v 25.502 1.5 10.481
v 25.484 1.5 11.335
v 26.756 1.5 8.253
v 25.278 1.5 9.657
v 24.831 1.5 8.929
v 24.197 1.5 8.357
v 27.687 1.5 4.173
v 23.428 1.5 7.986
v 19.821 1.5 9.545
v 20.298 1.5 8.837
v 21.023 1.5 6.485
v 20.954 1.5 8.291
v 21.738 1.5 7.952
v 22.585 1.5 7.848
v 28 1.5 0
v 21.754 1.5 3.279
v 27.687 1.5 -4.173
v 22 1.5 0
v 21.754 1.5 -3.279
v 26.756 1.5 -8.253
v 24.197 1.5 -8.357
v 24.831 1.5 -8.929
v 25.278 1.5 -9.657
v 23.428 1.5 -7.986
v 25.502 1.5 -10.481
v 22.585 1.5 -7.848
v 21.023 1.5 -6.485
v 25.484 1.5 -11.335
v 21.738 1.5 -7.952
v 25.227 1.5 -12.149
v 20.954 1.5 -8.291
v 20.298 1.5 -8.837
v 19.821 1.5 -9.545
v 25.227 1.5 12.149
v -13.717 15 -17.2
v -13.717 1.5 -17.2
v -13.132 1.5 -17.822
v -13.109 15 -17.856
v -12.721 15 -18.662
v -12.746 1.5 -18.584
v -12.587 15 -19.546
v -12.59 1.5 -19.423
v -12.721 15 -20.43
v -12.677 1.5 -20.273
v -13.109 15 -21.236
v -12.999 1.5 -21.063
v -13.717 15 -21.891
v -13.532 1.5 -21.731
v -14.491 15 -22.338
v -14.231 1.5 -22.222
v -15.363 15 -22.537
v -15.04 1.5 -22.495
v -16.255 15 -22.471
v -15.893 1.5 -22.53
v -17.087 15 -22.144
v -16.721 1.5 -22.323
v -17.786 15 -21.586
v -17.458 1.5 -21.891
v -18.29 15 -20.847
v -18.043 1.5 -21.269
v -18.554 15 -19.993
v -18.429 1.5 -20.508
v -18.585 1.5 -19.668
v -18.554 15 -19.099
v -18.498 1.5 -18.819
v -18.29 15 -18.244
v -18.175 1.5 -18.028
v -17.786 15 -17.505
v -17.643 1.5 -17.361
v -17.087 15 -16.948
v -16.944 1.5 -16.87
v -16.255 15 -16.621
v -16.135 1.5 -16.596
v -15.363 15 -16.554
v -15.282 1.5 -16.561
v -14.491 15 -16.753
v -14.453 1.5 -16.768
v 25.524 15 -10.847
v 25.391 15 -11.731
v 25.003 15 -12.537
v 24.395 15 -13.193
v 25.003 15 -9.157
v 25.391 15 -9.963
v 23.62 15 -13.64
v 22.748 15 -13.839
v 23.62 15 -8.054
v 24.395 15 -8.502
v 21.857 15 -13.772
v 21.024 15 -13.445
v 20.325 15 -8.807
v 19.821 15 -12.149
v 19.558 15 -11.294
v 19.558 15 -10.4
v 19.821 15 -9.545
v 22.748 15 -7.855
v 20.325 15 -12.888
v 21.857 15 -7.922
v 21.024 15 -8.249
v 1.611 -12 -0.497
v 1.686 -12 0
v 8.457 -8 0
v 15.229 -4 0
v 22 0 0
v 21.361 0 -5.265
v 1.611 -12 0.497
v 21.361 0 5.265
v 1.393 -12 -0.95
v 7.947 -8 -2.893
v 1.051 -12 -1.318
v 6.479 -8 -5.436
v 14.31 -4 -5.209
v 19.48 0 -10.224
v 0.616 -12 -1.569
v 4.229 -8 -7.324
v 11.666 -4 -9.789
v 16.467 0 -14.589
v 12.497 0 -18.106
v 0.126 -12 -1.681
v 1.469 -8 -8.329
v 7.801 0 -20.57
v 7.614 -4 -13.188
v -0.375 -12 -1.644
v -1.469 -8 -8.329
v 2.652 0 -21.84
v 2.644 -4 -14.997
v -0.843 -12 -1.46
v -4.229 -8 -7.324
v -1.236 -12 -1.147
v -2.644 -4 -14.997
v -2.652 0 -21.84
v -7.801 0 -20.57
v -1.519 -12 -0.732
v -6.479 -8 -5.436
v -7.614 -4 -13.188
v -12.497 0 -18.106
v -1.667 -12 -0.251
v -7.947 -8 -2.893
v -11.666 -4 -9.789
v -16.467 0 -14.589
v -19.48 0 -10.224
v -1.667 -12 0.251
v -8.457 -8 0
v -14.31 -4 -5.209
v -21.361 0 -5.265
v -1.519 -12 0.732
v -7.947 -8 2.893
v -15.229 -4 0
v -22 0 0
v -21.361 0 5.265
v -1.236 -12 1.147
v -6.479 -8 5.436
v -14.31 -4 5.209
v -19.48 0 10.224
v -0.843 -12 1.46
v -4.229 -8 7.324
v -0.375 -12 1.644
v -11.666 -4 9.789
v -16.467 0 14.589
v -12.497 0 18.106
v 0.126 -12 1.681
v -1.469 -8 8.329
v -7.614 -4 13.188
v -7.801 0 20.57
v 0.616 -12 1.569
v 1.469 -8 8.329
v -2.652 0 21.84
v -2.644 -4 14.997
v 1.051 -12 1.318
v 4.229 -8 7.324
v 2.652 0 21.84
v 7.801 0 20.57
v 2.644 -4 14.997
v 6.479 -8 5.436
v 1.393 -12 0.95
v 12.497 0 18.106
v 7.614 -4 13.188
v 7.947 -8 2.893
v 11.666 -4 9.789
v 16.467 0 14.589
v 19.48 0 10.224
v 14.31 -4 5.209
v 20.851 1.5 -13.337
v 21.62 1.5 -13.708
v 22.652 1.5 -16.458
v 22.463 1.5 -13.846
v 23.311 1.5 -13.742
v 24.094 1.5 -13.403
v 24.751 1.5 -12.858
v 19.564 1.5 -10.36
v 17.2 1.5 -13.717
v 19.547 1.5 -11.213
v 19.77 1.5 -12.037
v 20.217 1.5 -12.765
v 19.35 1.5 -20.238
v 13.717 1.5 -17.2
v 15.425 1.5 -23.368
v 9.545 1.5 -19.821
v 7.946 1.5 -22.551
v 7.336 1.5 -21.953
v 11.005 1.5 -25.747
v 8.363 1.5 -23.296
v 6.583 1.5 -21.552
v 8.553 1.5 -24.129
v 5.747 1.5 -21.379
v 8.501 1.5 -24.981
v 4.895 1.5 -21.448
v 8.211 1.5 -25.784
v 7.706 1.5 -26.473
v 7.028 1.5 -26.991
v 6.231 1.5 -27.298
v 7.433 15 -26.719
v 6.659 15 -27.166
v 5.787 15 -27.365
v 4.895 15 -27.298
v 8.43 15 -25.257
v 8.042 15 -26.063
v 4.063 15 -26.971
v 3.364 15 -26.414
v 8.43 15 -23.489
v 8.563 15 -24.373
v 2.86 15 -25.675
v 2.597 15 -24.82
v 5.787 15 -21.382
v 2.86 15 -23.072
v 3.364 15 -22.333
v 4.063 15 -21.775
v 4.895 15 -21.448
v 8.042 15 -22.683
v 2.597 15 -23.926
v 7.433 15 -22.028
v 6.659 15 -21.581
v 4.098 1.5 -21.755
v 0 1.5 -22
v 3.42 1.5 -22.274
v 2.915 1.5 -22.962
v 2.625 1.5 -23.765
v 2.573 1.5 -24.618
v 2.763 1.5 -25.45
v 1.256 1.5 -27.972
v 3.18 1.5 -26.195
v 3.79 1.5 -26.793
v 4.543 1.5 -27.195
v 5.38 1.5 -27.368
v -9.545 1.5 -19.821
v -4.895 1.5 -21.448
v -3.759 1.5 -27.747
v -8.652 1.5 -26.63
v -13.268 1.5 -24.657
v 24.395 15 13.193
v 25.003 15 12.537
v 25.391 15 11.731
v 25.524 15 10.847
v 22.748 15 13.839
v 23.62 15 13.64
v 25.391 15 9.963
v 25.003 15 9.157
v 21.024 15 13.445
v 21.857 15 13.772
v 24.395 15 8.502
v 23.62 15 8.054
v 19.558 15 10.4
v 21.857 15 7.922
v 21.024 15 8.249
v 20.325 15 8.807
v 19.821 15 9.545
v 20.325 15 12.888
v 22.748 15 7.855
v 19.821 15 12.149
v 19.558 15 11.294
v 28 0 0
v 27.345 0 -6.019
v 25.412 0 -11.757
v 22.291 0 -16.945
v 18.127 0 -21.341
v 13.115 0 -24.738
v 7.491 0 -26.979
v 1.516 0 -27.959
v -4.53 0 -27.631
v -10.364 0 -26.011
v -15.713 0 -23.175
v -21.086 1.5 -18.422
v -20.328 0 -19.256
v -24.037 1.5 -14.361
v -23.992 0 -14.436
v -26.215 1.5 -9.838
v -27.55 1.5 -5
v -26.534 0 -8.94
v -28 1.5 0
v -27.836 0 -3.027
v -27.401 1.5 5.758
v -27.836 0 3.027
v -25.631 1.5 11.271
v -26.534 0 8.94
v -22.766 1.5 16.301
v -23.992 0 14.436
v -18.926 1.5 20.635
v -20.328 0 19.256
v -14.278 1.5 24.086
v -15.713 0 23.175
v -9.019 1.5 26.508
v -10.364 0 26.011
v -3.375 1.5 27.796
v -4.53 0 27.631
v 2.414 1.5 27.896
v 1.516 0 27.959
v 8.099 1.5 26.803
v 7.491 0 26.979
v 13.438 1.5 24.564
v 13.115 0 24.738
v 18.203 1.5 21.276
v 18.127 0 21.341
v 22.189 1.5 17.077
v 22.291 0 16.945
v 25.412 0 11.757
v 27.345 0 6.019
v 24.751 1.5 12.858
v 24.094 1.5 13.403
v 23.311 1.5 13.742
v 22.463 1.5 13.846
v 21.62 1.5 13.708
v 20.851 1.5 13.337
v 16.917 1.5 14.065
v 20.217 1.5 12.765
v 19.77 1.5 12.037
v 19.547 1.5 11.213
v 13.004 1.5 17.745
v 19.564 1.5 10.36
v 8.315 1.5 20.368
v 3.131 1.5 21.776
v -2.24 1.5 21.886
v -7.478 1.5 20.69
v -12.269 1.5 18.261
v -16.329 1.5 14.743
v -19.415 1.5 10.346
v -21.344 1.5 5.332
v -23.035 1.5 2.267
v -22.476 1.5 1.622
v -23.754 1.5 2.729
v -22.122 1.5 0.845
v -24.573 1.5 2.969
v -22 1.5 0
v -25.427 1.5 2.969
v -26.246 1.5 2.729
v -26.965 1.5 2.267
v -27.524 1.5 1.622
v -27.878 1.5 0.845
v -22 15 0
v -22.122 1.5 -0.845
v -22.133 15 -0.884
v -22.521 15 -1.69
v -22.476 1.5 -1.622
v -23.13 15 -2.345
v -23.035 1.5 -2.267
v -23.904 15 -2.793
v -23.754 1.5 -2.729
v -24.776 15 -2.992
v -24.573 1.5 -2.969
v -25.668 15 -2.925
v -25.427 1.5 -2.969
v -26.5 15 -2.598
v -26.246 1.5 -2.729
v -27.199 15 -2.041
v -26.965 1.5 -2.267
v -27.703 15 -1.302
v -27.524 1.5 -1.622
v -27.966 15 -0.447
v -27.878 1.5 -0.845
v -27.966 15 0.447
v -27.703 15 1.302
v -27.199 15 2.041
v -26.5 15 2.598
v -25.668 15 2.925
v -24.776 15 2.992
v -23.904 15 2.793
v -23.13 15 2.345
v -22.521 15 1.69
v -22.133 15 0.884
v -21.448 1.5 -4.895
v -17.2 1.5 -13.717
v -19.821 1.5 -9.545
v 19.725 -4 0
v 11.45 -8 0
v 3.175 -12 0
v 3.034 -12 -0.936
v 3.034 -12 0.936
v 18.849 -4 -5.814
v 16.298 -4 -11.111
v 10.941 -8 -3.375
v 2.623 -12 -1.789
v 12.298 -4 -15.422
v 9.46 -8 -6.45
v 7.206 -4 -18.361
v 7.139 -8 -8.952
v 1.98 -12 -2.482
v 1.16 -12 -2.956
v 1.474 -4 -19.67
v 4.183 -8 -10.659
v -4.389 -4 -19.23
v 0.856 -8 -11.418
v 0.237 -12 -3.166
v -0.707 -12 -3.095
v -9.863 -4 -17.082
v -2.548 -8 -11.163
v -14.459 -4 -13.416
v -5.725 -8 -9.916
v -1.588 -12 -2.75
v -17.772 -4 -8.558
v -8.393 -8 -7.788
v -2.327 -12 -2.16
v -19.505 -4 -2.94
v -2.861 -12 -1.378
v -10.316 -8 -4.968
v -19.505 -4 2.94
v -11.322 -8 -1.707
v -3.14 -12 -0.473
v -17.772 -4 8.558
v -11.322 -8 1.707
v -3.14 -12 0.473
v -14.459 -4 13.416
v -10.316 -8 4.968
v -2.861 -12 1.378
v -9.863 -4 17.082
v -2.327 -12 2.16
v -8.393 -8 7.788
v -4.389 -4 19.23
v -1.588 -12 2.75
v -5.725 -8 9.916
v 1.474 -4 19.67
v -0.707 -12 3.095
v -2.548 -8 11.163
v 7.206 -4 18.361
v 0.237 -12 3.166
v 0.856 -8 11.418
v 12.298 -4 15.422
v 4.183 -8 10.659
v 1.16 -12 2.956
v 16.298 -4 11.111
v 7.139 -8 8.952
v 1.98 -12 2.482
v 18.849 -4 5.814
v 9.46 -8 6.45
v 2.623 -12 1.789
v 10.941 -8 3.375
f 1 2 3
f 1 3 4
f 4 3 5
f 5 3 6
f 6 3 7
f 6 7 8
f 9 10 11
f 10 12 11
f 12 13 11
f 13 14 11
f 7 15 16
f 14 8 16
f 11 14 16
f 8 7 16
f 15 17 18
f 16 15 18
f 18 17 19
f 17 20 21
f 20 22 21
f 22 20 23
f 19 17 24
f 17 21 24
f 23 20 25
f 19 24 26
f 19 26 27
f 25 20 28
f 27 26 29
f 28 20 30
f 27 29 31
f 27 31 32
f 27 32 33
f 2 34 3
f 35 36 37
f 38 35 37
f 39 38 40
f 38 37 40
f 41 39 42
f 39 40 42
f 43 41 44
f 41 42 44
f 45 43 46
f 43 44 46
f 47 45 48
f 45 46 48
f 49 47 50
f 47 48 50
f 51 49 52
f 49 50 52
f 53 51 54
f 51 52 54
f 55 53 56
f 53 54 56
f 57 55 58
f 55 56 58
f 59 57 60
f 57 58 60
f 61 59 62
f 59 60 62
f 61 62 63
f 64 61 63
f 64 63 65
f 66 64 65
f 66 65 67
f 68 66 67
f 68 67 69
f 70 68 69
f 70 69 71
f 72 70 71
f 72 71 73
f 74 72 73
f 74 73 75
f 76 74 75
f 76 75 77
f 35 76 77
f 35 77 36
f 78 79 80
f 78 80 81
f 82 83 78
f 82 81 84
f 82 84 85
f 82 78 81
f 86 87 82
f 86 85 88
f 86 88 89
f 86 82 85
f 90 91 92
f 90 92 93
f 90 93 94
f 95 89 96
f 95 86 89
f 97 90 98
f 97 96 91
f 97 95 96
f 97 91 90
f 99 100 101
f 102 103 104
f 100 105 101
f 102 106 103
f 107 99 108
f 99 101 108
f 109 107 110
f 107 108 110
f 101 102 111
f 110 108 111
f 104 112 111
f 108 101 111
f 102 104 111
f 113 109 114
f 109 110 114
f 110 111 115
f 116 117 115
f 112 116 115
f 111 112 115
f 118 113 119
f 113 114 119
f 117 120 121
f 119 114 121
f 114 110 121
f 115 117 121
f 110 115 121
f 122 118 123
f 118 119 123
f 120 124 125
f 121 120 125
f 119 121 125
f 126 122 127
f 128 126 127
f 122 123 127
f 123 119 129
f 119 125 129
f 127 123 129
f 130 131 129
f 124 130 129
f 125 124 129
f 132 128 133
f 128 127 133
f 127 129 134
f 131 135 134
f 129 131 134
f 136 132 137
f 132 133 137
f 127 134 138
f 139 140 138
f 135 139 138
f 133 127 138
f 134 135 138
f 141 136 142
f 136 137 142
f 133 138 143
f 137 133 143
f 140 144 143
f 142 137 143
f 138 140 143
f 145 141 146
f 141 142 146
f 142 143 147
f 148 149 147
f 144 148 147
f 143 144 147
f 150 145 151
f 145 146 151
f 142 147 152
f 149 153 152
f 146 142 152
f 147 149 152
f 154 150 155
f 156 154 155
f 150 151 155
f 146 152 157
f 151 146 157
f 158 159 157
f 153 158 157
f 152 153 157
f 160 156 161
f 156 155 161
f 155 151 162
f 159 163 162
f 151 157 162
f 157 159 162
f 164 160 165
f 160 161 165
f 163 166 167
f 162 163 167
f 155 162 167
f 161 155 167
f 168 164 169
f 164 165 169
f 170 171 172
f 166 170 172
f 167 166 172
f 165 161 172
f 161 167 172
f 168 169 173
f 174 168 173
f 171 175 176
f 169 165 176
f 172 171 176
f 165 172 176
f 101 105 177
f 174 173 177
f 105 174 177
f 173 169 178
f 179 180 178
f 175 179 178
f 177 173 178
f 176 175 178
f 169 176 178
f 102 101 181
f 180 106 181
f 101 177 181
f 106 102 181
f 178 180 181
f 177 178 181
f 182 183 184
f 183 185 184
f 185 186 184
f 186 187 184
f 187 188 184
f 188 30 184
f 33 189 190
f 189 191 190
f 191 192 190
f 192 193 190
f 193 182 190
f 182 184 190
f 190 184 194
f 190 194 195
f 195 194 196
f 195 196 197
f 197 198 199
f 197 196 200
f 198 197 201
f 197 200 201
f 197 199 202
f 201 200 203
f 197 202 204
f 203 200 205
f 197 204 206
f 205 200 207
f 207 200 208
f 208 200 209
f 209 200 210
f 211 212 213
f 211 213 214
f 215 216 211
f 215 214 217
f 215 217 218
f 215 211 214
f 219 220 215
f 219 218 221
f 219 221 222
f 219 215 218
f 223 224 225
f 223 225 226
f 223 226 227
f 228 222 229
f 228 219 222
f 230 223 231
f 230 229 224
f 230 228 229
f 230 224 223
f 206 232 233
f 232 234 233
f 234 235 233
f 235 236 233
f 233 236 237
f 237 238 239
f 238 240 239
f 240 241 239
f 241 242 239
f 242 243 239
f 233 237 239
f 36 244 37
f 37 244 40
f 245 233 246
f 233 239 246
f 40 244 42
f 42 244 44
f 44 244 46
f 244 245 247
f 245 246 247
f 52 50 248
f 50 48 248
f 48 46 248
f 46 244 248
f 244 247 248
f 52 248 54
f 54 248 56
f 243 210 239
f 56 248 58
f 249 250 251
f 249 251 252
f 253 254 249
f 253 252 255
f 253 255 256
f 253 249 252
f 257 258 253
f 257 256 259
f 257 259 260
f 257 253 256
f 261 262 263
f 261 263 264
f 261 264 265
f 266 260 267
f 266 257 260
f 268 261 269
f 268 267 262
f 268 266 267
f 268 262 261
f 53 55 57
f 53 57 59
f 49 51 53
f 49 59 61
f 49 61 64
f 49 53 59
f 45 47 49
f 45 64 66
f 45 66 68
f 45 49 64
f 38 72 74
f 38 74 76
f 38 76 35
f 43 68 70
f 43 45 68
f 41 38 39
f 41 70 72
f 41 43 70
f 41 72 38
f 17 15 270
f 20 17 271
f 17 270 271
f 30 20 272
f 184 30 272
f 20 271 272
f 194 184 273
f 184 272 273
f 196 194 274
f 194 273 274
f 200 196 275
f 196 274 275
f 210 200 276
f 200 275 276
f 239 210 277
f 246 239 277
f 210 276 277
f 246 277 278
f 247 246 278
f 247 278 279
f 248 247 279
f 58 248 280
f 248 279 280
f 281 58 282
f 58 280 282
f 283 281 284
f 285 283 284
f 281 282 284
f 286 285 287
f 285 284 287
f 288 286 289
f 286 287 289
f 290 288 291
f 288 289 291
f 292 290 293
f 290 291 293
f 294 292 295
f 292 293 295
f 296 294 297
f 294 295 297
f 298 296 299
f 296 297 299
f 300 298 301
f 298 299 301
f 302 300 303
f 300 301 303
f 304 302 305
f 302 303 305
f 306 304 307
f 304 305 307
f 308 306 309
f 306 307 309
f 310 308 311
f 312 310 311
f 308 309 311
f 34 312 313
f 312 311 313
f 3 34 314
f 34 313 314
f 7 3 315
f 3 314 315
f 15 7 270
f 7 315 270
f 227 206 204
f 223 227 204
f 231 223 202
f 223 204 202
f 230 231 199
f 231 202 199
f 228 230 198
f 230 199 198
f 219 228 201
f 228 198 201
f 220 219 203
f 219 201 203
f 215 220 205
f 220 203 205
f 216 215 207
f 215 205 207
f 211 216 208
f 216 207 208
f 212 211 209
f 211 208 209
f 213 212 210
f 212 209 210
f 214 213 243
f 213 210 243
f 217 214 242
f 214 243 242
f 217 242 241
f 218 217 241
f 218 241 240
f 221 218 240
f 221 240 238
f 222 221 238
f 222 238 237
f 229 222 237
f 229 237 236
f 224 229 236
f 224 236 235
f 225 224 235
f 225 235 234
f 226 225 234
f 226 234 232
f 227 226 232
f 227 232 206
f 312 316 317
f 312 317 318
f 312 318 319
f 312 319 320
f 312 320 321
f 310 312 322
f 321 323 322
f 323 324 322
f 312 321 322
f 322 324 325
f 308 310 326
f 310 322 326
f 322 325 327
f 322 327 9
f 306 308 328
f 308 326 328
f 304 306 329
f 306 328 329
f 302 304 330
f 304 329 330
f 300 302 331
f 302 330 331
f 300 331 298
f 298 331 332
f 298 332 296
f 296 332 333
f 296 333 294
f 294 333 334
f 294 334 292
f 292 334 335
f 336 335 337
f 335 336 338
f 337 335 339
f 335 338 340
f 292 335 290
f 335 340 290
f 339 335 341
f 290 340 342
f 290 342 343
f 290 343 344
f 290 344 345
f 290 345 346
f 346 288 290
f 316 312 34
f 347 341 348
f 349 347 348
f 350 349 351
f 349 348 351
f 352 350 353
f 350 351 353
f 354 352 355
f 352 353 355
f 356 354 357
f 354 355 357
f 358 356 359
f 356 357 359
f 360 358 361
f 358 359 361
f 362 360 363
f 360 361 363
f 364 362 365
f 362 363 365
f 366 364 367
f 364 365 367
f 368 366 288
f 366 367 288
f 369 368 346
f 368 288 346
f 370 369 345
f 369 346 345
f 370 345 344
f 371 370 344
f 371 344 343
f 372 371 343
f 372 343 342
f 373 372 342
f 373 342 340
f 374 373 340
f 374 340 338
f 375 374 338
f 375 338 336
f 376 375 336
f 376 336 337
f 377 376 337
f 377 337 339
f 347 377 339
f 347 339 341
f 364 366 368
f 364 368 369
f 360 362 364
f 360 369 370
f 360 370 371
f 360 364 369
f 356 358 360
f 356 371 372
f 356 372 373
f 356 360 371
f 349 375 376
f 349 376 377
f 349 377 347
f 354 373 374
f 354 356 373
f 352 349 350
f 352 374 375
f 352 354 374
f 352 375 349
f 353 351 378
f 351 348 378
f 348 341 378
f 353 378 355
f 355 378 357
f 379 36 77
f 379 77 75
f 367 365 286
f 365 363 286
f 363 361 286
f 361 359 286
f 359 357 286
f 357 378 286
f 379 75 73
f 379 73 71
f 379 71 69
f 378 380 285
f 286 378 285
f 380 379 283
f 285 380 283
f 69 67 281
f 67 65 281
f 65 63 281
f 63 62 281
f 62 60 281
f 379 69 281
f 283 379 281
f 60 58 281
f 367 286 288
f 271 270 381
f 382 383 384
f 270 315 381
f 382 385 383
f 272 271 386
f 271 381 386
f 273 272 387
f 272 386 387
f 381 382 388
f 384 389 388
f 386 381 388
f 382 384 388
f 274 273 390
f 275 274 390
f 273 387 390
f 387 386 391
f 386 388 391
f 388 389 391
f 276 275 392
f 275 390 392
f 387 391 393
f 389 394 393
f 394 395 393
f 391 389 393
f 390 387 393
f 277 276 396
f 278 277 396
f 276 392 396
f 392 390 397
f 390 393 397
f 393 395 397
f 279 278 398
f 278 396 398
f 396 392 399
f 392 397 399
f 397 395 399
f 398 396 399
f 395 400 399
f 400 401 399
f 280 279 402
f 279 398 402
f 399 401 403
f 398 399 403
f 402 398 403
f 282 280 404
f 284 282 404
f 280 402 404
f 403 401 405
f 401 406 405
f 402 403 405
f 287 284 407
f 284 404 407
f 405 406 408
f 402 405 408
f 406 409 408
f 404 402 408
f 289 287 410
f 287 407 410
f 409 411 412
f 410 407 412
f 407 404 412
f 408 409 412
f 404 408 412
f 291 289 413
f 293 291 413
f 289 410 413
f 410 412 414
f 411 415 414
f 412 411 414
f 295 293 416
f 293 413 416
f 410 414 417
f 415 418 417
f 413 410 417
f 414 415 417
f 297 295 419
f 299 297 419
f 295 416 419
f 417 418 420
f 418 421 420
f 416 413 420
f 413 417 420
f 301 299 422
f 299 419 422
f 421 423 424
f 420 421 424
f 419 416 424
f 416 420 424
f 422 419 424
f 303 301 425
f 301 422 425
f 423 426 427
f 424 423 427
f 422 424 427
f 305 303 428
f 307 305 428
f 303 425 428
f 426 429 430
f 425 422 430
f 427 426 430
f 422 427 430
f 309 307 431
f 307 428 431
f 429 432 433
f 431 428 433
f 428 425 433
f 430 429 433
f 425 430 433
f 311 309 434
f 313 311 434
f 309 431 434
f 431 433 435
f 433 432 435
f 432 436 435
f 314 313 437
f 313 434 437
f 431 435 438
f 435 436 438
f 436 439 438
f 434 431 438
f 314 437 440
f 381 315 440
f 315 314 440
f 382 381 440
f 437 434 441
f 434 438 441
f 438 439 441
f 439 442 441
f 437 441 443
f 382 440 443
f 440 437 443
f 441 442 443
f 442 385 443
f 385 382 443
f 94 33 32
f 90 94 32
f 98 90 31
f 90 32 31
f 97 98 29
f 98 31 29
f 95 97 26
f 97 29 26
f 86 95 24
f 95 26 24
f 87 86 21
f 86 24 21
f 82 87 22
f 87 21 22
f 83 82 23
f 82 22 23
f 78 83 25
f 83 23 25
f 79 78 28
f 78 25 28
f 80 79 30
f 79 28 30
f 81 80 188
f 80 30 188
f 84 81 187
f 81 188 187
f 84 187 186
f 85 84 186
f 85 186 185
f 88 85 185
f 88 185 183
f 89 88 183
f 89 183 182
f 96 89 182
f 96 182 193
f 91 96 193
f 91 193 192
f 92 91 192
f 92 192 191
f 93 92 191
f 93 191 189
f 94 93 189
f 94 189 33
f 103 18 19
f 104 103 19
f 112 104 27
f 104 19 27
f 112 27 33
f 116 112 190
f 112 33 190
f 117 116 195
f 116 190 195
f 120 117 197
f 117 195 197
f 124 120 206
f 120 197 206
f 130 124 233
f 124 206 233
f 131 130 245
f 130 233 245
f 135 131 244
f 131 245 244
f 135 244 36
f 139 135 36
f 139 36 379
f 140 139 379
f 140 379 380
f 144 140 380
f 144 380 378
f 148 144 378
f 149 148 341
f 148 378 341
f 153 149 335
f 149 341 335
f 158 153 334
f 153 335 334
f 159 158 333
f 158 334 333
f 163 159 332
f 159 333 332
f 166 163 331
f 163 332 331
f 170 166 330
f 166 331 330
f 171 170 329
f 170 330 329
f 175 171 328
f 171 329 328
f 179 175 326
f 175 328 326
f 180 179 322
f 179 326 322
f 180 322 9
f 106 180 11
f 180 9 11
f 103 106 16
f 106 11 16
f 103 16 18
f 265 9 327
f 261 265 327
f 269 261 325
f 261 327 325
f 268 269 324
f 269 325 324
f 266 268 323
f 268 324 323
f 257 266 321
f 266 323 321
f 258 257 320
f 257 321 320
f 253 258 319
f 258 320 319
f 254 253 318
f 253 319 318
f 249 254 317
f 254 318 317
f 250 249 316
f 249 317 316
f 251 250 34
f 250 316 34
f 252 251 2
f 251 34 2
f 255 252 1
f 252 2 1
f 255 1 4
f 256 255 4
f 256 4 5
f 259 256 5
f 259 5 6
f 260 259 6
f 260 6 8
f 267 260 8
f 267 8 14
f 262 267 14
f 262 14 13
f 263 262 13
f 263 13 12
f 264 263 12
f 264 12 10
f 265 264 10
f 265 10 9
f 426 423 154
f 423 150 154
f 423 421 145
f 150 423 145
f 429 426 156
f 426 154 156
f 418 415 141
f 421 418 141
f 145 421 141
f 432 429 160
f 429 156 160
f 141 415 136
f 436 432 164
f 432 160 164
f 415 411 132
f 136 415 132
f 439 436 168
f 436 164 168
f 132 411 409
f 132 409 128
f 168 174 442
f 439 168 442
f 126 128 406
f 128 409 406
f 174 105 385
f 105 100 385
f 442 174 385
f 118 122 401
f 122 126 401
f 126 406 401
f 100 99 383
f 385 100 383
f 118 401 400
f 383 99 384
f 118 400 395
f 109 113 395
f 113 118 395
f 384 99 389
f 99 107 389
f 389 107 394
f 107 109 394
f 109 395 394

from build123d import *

# Parameters (mm, degrees)
SKETCH3_R           = 3
BOSS_EXTRUDE1_DEPTH = 15
CIRPATTERN1_COUNT   = 5
CIRPATTERN1_ANGLE   = 205.714285714


with BuildPart() as part:
    # Sketch1 → Revolve1 (revolve)
    with BuildSketch(Plane.XY):
        Polygon((28, 0), (3.175, -12), (1.68595, -12), (22, 0), (22, 1.5), (28, 1.5), align=None)
    revolve(axis=Axis((0, -582.446756226, 0), (0, 1, 0)))

    # Sketch3 → Boss-Extrude1 (add)
    with BuildSketch(Plane(origin=(0, 0, 0), x_dir=(1, 0, 0), z_dir=(0, 1, 0))):
        with Locations((-25, 0)):
            Circle(SKETCH3_R)
    boss_extrude1 = extrude(amount=BOSS_EXTRUDE1_DEPTH)

    # CirPattern1: Boss-Extrude1 ×5 about axis
    cirpattern1_axis = Axis((0, 0, 0), (0, -1, 0))
    for i in range(1, CIRPATTERN1_COUNT):
        add(boss_extrude1.rotate(cirpattern1_axis, i * CIRPATTERN1_ANGLE / (CIRPATTERN1_COUNT - 1)))


solid = part.part
